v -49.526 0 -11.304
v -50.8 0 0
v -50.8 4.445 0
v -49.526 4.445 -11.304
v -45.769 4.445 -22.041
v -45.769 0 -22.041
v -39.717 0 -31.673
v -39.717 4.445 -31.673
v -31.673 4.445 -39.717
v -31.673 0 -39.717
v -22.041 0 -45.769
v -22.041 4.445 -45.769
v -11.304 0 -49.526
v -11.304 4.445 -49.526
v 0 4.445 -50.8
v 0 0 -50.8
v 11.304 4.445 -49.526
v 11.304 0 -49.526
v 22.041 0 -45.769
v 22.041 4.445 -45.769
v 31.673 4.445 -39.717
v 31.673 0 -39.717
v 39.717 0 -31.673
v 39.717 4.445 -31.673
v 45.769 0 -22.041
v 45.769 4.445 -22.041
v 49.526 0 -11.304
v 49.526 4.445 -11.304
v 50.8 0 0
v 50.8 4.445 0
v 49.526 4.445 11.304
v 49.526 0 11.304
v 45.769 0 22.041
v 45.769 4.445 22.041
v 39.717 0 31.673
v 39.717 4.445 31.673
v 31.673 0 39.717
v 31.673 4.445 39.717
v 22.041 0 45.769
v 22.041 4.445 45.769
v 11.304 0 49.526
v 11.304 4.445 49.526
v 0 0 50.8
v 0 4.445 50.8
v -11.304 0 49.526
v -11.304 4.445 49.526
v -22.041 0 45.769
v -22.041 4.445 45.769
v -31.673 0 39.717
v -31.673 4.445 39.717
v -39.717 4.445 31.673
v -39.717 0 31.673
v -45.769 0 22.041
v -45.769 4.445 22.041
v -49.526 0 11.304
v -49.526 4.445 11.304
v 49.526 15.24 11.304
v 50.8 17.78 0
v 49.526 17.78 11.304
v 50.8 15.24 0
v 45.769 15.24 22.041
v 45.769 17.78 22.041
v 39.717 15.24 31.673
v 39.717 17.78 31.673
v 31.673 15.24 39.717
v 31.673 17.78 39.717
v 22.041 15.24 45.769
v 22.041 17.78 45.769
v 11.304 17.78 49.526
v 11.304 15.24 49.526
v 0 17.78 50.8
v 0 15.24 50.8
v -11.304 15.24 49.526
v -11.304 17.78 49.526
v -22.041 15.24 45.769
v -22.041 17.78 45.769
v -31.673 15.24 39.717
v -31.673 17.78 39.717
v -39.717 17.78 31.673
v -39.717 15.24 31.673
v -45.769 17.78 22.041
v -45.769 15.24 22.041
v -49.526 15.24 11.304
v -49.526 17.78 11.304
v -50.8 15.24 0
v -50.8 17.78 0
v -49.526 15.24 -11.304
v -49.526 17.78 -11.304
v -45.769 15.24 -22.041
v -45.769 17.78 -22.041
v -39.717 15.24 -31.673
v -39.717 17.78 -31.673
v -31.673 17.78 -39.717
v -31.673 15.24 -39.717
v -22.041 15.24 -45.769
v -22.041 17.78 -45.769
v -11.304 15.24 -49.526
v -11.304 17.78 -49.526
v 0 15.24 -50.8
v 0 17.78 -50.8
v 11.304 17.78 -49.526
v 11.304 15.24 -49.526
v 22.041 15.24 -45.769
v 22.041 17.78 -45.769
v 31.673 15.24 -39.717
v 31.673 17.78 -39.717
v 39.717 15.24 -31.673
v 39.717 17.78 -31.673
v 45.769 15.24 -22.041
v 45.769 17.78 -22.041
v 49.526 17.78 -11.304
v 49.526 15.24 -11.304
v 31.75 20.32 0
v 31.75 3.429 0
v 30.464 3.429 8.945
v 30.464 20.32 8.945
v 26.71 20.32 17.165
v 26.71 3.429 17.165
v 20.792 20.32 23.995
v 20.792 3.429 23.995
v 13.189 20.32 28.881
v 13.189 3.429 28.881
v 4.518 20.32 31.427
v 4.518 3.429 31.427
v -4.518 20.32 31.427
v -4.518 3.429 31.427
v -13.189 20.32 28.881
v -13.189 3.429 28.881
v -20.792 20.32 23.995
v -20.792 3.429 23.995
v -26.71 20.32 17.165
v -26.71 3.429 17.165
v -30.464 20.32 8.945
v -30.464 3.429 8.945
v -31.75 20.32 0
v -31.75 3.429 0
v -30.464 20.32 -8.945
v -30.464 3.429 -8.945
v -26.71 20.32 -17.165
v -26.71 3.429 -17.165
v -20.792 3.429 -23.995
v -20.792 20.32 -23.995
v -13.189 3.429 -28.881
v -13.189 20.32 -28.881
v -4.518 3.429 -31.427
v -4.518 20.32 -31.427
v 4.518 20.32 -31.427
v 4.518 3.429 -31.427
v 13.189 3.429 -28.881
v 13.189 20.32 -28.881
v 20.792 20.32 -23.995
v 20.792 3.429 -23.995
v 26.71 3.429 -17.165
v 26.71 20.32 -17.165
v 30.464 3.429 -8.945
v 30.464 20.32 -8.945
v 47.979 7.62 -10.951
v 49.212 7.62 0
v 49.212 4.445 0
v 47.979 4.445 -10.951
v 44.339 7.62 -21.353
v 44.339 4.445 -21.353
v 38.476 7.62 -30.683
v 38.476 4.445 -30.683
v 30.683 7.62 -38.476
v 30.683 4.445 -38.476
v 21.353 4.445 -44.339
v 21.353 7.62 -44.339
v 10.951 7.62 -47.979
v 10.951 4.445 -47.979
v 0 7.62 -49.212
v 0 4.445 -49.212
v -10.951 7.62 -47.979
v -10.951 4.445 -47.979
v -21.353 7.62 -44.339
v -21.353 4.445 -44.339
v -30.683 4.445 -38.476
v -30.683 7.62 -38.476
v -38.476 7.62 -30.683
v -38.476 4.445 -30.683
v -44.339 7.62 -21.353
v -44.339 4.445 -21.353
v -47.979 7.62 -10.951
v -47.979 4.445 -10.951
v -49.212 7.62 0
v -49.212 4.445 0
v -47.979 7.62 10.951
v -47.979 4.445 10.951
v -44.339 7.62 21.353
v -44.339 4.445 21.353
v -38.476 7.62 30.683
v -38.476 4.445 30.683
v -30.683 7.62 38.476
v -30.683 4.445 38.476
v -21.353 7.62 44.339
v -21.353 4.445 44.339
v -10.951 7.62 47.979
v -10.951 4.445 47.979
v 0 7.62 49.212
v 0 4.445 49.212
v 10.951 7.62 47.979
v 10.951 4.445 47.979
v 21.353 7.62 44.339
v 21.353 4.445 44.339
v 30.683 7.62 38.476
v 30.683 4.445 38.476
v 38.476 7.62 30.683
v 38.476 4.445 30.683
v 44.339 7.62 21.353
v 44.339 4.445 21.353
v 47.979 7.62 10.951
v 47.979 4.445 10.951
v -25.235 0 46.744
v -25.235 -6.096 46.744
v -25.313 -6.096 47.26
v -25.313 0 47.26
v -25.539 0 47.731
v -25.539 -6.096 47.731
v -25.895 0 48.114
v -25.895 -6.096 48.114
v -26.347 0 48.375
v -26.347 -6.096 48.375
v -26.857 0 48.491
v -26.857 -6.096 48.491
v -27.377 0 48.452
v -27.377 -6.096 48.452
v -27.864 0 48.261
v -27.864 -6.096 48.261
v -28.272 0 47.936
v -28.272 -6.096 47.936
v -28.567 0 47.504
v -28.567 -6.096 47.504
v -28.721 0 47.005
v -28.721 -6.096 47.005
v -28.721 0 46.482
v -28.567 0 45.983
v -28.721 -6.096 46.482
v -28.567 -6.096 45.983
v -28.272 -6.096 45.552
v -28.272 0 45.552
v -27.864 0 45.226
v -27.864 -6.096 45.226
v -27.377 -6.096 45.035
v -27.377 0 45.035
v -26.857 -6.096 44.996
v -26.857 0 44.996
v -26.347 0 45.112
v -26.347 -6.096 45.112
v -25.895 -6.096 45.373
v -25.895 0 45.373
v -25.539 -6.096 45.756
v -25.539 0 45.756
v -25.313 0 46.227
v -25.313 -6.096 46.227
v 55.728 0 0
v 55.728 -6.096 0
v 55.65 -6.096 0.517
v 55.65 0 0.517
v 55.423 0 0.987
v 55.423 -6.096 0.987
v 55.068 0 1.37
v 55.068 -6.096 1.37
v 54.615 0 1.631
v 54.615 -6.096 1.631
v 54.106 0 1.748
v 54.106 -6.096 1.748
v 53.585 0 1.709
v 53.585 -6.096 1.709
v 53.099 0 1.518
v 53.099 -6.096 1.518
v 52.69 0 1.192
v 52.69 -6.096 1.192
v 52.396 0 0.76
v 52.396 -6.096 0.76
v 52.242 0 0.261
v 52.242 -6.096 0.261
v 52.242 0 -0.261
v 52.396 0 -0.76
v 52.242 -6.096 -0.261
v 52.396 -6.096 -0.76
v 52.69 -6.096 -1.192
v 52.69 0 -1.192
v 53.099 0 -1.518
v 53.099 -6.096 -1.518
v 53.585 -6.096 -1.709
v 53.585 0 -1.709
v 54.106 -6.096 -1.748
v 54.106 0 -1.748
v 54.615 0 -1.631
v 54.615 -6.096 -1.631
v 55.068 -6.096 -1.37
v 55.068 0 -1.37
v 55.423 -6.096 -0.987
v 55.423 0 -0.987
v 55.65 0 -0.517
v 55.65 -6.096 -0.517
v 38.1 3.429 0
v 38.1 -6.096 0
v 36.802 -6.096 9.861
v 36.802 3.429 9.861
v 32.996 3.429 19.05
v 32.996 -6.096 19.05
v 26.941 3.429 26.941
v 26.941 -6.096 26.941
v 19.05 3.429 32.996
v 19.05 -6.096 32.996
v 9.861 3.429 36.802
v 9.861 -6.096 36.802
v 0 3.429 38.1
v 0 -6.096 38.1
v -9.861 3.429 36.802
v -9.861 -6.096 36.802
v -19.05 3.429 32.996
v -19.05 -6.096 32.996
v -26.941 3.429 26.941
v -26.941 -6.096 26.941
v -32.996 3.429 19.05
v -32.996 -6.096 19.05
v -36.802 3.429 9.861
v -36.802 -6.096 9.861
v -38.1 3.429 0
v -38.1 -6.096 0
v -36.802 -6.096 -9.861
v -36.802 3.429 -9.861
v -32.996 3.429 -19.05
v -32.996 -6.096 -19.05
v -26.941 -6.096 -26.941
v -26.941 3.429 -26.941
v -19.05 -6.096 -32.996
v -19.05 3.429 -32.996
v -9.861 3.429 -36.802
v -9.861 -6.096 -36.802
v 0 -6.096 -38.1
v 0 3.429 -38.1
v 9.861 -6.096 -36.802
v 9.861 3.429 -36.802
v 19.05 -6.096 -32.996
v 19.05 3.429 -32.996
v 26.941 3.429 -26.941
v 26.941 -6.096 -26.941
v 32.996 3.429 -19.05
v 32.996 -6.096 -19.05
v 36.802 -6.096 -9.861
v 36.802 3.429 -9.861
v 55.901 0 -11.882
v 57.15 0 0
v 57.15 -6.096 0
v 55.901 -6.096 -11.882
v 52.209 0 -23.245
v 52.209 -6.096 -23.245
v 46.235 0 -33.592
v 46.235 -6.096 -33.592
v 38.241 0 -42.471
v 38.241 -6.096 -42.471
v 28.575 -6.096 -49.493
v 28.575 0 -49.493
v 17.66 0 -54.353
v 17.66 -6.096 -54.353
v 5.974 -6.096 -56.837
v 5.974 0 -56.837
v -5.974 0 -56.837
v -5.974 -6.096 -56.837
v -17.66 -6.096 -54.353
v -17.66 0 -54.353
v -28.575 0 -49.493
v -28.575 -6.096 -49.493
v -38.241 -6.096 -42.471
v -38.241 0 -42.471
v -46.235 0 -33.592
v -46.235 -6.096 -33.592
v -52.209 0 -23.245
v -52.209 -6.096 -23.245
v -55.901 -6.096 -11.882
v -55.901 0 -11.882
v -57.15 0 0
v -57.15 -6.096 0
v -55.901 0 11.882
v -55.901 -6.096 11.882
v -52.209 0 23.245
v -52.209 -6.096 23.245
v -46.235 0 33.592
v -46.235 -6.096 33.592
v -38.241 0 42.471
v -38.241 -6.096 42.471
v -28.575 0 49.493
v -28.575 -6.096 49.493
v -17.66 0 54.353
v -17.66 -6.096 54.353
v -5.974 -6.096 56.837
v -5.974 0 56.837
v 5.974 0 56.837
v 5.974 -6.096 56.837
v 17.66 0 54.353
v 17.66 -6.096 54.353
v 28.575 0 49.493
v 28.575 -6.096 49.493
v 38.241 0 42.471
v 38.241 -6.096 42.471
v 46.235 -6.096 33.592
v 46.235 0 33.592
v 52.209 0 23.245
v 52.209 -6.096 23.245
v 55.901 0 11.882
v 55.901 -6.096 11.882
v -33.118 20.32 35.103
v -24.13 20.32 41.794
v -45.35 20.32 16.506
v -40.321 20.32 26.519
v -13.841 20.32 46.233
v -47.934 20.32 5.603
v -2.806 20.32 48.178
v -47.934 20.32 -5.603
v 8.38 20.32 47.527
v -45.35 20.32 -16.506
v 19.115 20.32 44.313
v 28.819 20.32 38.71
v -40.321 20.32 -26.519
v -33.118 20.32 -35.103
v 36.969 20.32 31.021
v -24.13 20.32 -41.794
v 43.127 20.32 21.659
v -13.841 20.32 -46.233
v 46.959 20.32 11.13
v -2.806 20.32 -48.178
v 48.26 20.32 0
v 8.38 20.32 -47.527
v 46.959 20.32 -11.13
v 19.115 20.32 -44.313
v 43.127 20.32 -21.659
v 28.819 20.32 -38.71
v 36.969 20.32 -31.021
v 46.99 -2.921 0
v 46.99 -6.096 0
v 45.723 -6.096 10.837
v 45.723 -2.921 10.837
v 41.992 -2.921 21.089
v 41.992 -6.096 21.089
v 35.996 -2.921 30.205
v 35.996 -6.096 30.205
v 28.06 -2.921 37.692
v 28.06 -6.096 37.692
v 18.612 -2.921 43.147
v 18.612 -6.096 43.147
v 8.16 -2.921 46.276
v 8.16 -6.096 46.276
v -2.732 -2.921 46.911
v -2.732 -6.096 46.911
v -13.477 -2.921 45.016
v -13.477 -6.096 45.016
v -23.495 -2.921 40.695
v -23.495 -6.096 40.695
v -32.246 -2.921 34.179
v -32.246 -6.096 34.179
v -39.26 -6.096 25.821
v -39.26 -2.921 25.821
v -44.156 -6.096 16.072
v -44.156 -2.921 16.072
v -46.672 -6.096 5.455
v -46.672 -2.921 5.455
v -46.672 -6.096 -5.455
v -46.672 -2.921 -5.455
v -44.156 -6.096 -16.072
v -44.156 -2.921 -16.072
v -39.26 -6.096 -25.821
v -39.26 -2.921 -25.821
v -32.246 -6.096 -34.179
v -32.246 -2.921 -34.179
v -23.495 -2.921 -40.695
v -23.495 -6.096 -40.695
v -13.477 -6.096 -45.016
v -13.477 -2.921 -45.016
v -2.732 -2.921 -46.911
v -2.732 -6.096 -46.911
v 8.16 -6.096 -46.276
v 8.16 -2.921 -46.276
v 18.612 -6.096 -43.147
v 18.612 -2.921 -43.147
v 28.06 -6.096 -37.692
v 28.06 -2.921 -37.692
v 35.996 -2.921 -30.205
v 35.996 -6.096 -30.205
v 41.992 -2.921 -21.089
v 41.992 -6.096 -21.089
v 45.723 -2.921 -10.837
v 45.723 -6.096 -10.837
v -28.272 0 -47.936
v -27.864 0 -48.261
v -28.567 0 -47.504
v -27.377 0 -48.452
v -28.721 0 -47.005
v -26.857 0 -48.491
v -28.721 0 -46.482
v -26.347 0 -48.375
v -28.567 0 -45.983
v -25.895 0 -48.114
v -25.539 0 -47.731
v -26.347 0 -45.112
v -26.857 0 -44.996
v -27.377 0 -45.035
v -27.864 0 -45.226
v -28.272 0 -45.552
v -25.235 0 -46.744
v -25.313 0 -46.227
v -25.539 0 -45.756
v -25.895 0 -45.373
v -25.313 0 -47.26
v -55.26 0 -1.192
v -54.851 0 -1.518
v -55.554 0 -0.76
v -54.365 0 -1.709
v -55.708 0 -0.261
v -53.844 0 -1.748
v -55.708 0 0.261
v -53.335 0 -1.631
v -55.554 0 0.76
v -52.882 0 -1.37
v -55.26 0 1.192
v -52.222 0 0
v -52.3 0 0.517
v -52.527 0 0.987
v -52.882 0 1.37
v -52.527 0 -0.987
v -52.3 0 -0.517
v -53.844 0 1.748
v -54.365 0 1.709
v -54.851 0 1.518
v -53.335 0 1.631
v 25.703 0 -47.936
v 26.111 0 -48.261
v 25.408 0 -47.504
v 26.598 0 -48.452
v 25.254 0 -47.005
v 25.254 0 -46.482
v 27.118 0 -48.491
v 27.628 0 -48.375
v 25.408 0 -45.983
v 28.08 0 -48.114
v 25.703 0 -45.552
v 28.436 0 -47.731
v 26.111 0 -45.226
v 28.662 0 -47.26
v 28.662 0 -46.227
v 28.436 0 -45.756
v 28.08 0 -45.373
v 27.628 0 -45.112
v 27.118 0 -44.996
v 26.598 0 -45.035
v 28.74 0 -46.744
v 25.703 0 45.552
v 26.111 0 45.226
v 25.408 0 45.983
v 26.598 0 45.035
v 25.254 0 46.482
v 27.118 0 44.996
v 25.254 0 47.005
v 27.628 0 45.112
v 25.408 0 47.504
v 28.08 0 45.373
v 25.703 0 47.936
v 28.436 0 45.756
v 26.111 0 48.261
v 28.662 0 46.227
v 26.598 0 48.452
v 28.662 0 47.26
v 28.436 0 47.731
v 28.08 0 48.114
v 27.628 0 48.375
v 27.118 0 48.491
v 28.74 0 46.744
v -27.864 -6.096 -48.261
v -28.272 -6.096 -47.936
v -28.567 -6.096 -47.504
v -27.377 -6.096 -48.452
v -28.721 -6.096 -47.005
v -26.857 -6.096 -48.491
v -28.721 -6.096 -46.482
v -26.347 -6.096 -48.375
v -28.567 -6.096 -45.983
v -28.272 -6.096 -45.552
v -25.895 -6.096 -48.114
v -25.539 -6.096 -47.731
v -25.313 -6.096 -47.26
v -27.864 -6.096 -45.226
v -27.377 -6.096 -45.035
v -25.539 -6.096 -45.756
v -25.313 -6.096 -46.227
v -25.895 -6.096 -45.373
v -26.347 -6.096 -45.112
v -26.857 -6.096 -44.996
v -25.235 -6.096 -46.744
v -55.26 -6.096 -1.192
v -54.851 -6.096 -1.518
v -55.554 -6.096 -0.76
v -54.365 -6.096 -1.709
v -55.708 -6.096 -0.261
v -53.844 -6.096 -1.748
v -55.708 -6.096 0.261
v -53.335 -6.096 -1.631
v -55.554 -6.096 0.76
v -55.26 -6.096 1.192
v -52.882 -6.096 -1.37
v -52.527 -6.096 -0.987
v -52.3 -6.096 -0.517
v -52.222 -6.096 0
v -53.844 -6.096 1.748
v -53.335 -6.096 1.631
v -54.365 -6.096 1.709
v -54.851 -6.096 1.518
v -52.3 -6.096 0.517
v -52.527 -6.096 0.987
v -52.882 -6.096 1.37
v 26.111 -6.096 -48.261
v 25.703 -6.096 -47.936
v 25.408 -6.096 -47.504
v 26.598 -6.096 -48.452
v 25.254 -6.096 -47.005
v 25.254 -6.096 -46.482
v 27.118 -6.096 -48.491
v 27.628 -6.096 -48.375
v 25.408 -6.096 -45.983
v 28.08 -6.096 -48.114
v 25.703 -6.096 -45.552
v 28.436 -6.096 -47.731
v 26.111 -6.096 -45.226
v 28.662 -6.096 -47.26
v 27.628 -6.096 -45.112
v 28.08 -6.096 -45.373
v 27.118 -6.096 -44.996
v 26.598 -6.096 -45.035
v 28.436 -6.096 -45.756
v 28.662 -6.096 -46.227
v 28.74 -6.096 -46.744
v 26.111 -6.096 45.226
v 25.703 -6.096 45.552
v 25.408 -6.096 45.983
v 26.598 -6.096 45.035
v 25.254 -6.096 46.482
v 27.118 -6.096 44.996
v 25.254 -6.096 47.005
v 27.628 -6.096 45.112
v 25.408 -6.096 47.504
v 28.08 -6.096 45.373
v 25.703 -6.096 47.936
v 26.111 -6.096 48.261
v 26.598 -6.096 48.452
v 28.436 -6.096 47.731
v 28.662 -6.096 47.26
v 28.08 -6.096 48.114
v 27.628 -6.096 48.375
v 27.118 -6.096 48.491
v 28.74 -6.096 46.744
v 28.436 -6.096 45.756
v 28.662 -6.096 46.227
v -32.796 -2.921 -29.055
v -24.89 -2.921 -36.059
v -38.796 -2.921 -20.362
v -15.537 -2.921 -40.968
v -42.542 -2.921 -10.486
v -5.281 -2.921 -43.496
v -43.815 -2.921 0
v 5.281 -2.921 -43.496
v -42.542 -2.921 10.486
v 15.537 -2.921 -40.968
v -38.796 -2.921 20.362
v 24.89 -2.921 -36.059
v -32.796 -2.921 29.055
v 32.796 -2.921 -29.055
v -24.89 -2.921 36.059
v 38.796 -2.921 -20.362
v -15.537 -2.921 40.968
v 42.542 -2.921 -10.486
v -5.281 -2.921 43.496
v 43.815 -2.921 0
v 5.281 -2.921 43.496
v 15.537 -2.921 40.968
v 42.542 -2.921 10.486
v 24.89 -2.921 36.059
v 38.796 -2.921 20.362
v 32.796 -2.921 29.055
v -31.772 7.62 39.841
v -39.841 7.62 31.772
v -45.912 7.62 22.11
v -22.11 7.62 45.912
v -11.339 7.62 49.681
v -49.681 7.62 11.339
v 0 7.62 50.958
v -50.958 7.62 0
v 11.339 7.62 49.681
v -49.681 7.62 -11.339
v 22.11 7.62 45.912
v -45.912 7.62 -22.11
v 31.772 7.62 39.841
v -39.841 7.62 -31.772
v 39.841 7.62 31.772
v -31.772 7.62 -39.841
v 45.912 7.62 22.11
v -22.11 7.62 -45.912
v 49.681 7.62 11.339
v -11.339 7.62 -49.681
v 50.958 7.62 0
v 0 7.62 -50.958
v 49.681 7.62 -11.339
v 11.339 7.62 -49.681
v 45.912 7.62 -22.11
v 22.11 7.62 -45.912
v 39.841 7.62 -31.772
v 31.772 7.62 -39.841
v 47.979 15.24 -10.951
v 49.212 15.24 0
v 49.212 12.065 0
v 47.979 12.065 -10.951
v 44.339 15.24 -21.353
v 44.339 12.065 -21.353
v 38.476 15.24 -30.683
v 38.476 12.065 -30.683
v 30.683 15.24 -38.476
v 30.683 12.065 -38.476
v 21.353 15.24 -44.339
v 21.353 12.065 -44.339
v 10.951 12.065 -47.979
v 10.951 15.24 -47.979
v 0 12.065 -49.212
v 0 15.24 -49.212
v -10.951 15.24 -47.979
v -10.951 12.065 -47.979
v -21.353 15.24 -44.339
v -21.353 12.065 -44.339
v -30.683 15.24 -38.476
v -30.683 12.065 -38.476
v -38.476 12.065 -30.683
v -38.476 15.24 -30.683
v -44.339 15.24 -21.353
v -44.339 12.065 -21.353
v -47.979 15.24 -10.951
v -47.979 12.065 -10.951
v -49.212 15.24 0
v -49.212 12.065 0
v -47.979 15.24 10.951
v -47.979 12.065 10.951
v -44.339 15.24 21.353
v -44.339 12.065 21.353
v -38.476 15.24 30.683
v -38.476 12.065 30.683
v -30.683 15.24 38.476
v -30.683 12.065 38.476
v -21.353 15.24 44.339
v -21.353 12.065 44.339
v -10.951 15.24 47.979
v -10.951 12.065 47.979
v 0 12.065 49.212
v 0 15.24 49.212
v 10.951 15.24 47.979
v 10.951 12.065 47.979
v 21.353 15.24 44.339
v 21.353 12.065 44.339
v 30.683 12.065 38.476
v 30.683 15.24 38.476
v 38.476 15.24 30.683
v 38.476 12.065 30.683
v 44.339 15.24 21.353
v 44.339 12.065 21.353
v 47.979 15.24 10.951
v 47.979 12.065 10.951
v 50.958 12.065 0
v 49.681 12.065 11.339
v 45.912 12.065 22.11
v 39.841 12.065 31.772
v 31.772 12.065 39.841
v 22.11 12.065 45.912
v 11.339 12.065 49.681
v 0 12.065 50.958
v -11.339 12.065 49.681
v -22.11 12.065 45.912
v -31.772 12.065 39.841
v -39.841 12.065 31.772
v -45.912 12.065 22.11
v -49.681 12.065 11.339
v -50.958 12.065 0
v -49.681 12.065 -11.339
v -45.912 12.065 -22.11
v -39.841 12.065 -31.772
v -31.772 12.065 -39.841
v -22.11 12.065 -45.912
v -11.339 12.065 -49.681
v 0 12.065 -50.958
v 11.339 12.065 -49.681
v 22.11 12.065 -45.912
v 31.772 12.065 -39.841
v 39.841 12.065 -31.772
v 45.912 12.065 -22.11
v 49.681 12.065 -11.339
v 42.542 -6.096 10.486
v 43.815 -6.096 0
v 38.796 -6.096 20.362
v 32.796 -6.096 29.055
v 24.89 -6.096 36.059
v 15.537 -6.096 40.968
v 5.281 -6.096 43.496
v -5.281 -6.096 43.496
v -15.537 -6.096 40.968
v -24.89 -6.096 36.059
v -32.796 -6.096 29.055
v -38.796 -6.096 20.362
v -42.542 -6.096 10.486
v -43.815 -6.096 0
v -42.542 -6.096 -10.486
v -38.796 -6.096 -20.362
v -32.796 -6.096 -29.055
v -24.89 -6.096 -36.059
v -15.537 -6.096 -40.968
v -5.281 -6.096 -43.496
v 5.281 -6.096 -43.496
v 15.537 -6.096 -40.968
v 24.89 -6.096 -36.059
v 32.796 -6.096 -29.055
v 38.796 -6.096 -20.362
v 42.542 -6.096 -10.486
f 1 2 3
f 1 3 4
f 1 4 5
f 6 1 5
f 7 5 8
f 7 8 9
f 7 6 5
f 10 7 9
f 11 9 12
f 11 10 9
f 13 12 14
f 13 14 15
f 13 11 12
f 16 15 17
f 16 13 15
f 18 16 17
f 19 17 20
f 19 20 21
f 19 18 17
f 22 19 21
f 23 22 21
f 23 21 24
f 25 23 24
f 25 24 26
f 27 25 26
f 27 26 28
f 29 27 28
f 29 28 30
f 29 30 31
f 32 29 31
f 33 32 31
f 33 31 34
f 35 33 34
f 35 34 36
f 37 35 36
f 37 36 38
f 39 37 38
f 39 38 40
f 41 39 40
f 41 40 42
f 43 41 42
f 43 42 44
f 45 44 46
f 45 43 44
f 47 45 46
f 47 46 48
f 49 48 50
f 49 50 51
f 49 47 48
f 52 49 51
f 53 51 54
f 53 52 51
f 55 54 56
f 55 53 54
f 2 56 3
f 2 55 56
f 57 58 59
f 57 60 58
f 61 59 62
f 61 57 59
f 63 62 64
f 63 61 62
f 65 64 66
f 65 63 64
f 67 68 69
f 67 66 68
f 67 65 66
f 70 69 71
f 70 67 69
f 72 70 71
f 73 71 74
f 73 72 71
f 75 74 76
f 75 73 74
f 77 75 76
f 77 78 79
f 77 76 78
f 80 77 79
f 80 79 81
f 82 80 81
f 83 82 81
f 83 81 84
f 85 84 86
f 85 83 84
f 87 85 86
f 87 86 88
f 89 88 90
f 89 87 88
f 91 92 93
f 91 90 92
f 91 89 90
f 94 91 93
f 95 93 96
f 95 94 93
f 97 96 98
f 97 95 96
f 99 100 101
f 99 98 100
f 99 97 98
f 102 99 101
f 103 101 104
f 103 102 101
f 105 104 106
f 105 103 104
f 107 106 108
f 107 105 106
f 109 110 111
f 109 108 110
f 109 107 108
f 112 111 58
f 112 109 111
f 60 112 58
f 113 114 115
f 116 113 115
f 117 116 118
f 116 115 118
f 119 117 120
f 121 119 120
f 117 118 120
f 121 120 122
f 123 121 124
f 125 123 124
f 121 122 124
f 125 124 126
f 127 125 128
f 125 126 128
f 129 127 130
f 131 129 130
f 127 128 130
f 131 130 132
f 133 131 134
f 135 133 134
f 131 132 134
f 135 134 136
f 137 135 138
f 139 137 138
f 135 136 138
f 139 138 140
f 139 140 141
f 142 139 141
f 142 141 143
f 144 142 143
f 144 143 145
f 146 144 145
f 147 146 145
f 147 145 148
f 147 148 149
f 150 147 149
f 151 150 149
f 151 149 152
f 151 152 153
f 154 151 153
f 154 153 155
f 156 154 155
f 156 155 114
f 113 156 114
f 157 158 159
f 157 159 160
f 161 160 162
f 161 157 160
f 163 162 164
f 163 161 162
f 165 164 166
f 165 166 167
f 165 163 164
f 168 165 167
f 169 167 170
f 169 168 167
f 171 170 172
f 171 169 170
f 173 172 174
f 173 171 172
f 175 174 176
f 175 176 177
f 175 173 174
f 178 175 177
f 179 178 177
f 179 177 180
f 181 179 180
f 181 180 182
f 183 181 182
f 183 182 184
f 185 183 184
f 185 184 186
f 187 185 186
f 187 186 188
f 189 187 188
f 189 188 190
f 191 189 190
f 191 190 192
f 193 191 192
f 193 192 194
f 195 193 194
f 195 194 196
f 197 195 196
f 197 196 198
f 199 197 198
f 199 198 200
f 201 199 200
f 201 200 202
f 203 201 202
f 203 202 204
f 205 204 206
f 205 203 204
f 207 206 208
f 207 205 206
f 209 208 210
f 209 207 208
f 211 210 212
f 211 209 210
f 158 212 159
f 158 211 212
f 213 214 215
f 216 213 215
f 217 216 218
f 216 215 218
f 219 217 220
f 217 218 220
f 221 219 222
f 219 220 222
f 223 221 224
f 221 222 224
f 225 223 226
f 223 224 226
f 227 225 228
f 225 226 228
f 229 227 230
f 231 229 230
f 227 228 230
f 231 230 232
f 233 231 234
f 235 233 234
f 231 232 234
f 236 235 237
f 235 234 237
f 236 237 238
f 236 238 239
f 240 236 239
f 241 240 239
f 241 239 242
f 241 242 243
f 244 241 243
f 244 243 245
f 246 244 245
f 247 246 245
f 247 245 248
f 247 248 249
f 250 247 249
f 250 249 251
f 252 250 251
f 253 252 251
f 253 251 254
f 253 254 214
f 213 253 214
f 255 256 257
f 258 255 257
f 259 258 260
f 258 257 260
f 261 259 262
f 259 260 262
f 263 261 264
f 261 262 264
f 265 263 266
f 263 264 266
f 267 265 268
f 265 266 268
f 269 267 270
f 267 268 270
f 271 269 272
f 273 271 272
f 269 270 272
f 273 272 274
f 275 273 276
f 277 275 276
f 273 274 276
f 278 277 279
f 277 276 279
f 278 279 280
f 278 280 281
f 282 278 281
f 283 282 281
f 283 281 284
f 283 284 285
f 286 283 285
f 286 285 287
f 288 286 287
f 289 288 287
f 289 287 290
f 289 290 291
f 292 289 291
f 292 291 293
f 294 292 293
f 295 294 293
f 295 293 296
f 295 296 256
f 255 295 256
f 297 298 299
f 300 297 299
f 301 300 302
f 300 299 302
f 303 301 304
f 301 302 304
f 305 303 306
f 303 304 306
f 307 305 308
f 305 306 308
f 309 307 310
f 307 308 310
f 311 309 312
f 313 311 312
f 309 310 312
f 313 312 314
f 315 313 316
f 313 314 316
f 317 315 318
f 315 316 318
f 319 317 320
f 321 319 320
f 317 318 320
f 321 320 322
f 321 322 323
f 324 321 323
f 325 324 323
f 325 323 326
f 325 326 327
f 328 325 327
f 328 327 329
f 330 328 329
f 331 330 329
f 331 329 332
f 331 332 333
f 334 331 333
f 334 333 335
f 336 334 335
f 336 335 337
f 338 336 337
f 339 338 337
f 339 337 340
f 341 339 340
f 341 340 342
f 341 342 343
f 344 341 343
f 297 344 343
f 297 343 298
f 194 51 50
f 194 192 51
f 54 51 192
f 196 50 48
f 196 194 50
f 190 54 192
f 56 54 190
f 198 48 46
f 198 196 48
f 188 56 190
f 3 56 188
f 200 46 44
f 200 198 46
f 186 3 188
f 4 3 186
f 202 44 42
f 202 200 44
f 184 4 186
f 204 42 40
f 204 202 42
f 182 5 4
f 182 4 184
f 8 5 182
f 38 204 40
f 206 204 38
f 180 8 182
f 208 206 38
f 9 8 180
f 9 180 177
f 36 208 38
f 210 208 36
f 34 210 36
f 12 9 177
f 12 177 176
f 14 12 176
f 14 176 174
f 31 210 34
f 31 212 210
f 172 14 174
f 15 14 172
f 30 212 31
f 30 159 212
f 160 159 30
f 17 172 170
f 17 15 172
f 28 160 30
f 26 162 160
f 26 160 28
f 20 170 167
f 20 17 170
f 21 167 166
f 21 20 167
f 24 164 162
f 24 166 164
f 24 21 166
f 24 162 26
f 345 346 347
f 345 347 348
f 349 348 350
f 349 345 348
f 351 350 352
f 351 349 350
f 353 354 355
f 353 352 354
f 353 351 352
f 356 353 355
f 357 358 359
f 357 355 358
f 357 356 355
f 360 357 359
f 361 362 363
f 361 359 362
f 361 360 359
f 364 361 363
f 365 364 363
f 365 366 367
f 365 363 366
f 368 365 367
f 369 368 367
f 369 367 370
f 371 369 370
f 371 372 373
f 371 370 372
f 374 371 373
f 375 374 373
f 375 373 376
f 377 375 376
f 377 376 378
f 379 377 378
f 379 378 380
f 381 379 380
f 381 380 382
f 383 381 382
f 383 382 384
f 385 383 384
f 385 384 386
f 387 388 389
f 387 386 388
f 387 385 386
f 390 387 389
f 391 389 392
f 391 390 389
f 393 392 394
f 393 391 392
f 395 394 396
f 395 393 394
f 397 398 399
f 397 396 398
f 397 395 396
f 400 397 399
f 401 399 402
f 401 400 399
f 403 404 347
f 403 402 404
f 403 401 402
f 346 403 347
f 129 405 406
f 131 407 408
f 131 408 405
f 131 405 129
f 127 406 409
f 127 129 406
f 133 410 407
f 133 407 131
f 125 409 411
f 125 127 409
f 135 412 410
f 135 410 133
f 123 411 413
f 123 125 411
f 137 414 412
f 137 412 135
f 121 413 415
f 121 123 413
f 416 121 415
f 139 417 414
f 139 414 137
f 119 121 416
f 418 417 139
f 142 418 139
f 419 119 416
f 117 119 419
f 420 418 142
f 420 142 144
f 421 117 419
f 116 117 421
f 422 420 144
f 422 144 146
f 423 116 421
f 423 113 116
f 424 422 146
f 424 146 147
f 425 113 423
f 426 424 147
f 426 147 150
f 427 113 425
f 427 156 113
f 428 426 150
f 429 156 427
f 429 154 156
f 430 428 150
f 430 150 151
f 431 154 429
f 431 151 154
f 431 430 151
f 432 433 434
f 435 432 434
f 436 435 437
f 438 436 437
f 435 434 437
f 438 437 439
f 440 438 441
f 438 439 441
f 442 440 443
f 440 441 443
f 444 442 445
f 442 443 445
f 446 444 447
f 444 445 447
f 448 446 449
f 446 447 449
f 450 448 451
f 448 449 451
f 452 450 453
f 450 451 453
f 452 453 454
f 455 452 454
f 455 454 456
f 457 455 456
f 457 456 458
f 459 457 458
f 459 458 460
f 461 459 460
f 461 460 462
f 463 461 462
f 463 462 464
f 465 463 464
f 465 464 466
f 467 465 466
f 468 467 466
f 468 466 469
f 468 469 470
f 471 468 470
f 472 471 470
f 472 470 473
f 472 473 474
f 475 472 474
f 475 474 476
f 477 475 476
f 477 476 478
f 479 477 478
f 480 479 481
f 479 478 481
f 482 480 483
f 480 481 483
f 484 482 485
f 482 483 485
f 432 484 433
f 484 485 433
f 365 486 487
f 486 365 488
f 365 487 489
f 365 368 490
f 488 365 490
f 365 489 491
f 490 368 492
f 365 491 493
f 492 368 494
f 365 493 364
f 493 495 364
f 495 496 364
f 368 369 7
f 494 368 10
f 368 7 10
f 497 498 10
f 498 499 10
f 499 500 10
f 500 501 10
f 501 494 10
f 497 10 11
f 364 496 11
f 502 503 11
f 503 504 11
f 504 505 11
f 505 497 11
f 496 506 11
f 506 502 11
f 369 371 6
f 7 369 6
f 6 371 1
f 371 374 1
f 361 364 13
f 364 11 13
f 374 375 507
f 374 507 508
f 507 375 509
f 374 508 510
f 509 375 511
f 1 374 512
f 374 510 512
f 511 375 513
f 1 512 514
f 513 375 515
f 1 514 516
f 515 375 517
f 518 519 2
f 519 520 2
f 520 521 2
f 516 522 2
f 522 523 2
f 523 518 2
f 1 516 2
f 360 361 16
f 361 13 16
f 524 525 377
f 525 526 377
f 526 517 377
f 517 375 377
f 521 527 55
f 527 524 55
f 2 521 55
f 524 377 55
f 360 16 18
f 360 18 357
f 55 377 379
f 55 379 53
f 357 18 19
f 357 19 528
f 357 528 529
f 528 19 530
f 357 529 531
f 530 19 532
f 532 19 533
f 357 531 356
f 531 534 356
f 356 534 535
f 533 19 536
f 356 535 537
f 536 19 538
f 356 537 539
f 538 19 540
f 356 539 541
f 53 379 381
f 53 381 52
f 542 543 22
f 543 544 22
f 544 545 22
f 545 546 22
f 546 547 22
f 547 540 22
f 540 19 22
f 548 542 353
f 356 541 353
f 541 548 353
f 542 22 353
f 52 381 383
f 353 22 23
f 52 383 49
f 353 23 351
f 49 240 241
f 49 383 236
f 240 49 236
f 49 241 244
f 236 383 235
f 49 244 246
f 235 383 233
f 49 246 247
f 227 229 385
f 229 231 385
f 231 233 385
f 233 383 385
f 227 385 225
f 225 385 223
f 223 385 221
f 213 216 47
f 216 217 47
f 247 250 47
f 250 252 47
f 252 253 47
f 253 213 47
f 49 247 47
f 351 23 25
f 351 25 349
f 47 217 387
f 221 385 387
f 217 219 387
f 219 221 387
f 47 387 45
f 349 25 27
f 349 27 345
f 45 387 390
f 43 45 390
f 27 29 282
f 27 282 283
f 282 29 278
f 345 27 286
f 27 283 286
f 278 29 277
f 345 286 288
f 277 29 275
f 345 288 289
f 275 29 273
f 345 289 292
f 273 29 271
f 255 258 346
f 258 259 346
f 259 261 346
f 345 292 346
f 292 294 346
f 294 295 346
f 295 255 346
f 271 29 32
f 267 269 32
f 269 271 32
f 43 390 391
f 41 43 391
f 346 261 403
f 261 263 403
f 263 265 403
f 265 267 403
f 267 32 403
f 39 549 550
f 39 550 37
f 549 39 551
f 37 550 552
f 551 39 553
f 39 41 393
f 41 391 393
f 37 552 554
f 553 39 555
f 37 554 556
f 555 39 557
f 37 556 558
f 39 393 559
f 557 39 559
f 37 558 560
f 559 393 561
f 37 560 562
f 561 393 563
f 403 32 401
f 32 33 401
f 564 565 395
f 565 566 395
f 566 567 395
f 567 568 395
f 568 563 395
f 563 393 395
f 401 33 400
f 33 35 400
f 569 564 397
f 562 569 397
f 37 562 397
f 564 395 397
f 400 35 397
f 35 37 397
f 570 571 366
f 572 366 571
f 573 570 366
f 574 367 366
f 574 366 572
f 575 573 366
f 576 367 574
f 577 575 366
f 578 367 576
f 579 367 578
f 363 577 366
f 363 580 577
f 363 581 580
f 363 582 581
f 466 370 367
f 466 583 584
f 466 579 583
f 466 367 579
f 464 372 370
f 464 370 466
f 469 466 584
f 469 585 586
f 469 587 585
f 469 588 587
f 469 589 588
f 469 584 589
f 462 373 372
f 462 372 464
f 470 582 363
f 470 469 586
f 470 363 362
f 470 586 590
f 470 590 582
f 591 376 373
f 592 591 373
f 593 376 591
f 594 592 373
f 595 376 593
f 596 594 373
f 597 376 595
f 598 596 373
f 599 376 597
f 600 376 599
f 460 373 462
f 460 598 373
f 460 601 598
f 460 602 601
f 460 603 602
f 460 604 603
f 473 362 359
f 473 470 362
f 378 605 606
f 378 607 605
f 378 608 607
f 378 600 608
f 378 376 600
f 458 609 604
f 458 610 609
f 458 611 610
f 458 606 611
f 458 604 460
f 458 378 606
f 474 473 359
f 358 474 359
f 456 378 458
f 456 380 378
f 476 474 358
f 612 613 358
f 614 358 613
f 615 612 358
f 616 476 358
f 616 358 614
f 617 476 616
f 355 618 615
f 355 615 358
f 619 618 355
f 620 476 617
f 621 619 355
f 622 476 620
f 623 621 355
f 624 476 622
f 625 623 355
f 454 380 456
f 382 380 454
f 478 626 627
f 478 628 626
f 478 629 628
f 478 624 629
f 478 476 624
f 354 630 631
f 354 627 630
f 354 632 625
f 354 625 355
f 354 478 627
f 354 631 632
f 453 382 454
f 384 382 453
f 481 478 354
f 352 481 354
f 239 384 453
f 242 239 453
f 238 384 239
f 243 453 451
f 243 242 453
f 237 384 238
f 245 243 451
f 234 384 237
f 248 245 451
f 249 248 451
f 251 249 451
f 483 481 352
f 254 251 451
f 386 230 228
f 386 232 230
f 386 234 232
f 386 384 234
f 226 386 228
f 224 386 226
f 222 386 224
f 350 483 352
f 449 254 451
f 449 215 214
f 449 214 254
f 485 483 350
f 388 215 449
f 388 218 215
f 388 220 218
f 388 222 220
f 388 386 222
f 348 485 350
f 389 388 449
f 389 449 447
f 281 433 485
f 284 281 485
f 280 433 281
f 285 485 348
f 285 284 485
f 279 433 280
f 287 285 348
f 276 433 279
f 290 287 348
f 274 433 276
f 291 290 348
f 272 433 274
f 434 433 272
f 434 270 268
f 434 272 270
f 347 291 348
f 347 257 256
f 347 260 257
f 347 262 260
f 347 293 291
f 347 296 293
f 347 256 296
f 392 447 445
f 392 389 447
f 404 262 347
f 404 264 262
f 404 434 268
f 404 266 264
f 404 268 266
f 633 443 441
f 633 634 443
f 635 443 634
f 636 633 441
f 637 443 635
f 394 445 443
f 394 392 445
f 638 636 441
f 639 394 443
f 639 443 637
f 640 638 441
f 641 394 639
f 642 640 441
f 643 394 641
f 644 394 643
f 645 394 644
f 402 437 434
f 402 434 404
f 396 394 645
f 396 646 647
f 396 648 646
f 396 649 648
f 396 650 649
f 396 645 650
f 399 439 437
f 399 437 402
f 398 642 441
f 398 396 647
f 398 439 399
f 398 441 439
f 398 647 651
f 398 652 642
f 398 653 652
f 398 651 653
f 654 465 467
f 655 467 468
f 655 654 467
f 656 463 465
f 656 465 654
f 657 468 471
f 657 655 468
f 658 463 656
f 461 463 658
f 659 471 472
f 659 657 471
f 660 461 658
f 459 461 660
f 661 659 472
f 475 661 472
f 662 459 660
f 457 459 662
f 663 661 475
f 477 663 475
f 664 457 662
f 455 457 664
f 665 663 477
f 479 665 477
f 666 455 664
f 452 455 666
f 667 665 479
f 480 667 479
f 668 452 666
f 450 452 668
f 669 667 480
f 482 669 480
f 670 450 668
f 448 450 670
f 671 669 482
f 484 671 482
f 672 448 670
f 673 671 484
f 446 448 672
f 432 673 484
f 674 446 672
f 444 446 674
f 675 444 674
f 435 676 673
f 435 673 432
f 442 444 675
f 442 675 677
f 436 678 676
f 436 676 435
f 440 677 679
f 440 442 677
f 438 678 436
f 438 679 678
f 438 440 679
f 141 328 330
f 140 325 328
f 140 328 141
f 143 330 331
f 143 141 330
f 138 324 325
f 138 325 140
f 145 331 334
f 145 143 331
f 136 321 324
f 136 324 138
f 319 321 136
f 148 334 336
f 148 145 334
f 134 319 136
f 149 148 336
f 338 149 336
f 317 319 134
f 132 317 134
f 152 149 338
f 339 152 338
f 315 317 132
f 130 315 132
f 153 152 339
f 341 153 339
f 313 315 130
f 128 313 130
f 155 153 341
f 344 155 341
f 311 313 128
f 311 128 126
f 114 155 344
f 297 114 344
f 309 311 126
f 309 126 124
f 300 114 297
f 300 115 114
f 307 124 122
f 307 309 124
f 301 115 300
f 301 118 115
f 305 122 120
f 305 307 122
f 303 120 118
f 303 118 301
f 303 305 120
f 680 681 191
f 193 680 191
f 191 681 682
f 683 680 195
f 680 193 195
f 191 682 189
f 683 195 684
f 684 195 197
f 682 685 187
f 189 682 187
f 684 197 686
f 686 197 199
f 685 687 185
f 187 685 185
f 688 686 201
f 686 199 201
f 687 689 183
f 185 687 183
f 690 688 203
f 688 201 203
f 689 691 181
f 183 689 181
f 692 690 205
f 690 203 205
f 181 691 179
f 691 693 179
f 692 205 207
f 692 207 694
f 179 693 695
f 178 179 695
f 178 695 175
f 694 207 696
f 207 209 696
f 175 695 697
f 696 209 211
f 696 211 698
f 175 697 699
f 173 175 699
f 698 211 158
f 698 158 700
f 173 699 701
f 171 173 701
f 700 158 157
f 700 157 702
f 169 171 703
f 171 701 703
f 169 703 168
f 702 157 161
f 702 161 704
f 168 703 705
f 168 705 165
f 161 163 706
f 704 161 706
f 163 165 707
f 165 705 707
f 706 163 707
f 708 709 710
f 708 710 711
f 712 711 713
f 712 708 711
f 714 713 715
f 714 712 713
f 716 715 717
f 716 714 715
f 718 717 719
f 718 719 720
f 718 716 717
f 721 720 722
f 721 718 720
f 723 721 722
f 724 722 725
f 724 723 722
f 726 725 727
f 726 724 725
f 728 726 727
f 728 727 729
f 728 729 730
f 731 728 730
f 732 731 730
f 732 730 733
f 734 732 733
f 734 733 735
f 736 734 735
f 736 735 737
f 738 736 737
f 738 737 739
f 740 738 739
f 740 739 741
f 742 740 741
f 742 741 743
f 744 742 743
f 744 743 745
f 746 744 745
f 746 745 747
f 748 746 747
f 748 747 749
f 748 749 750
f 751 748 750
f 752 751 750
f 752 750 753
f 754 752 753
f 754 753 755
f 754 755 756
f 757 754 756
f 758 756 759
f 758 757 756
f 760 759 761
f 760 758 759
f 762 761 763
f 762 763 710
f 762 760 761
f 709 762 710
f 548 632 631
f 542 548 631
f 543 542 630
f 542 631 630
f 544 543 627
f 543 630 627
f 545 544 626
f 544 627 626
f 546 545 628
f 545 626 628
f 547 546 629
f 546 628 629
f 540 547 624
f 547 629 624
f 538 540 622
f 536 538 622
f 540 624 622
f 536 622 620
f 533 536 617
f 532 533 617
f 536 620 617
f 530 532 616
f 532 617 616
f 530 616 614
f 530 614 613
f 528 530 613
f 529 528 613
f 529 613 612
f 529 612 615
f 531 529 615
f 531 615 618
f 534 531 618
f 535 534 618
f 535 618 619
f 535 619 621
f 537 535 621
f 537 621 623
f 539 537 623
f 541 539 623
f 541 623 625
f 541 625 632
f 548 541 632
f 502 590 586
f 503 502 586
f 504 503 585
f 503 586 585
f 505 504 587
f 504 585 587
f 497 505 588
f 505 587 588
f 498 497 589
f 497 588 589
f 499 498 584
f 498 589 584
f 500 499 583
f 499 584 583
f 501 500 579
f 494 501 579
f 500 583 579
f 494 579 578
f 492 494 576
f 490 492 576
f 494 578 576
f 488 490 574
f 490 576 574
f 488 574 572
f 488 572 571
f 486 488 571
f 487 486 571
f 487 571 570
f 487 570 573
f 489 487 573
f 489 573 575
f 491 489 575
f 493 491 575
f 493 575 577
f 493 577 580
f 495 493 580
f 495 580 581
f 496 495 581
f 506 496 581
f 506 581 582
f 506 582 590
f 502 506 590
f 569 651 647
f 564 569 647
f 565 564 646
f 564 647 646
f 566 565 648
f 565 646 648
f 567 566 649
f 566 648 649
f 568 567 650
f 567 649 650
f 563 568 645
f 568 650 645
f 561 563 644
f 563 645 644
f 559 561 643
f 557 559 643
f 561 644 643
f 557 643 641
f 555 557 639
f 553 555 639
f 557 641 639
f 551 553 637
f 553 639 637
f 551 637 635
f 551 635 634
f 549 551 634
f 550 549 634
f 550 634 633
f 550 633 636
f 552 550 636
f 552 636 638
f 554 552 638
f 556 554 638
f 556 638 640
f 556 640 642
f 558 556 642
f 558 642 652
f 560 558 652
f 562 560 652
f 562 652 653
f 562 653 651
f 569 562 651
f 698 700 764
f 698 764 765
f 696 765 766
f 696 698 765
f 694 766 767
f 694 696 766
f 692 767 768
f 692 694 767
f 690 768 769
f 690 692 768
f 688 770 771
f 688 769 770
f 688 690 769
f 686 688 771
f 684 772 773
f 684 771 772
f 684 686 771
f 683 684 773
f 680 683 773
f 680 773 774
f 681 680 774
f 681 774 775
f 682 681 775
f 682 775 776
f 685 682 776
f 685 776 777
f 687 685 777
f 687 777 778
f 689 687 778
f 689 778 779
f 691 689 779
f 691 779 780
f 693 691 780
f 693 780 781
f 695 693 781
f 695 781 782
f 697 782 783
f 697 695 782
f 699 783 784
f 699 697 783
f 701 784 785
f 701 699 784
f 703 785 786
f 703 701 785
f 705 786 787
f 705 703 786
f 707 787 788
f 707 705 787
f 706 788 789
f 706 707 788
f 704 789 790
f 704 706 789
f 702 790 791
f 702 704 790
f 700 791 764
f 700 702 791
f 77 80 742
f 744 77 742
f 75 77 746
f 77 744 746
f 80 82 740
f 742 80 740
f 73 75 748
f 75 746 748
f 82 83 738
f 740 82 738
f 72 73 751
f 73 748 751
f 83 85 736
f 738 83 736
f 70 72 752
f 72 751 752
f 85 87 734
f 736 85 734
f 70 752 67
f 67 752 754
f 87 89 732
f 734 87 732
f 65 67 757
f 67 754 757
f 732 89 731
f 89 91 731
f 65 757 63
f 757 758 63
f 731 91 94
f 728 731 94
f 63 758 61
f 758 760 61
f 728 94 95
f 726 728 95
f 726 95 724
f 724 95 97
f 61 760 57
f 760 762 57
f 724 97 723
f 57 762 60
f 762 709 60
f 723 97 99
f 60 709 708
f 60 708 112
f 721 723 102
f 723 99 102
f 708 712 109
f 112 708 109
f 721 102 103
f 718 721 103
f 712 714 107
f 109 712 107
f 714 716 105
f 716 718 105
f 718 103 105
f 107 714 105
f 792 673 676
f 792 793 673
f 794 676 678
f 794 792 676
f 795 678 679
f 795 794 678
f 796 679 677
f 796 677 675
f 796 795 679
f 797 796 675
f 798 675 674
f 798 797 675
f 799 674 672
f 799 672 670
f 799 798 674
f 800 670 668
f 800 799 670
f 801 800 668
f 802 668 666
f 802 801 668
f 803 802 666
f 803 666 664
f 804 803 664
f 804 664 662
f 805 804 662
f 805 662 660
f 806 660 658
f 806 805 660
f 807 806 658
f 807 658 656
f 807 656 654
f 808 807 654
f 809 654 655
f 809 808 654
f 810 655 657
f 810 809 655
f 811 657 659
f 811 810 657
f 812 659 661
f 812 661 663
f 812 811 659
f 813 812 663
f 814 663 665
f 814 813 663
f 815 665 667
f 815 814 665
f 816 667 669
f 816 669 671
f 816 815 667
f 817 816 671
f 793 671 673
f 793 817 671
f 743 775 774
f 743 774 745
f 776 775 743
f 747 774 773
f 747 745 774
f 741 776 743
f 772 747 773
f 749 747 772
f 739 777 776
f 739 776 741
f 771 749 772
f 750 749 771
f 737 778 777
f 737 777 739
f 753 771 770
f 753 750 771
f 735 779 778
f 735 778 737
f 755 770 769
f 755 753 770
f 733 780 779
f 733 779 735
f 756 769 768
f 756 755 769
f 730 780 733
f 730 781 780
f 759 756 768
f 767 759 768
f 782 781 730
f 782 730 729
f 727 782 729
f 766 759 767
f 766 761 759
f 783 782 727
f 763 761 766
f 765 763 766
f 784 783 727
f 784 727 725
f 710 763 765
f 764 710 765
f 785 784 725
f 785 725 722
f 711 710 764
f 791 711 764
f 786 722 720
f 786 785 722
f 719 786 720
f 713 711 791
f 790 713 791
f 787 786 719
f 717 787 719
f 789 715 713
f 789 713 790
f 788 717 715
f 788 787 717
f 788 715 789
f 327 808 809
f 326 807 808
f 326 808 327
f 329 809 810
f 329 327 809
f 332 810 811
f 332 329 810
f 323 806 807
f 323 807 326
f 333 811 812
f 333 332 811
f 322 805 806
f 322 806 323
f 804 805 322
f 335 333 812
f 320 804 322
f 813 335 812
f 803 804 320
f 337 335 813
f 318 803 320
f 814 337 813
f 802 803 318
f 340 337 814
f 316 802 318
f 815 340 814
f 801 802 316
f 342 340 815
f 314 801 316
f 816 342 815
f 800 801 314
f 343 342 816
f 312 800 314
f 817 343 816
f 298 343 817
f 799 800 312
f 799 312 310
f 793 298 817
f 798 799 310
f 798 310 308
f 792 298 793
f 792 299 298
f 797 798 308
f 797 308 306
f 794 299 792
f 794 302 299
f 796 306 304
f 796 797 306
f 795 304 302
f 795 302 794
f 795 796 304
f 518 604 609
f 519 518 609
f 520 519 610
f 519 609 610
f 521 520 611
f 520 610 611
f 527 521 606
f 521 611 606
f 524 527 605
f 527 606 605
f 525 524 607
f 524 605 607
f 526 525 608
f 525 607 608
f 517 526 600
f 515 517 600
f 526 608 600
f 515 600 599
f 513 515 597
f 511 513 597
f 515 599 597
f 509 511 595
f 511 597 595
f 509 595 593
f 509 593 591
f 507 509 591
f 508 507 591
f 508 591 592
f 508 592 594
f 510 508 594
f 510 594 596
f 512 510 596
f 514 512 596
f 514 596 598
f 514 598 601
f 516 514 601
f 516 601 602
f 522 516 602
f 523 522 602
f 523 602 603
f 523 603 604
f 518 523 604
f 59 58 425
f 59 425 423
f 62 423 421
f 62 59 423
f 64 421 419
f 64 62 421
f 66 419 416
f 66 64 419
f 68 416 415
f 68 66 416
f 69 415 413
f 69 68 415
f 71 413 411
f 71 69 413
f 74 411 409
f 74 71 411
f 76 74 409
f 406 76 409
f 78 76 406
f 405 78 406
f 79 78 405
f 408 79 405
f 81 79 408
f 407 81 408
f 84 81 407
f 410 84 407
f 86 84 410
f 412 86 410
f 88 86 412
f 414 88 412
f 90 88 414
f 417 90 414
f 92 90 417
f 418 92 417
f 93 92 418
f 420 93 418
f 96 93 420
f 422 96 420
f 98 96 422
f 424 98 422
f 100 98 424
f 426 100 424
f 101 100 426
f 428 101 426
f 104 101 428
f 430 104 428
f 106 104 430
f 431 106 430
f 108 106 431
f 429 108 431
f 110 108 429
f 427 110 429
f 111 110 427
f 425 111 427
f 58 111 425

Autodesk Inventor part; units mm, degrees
ref_plane "YZ Plane" through (0, 0, 0) normal (1, 0, 0) x (0, 1, 0)
ref_plane "XZ Plane" through (0, 0, 0) normal (0, 1, 0) x (-1, 0, 0)
ref_plane "XY Plane" through (0, 0, 0) normal (0, 0, 1) x (1, 0, 0)
sketch "Sketch1" plane through (0, 0, 0) normal (0, 1, 0) x (-1, 0, 0)
  circle A0 centre (0, 0) radius 50.8
  dimension "d0" = 101.6
extrude "Extrusion1" add sketch "Sketch1" along normal blind 7.62
sketch "Sketch2" plane through (0, 7.62, 0) normal (0, 1, 0) x (1, 0, 0)
  circle A0 centre (0, 0) radius 49.2125
  circle A1 centre (0, 0) radius 50.8
  dimension "d3" = 98.425
extrude "Extrusion2" cut sketch "Sketch2" against normal blind 3.175
sketch "Sketch3" plane through (0, 7.62, 0) normal (0, 1, 0) x (1, 0, 0)
  circle A0 centre (0, 0) radius 50.9584
extrude "Extrusion3" add sketch "Sketch3" along normal blind 7.62
sketch "Sketch4" plane through (0, 15.24, 0) normal (0, 1, 0) x (1, 0, 0)
  point P0 (0, 0)
sketch "Sketch5" plane through (0, 15.24, 0) normal (0, 1, 0) x (1, 0, 0)
  circle A0 centre (0, 0) radius 49.2125
  circle A1 centre (0, 0) radius 50.9584
  dimension "d8" = 98.425
extrude "Extrusion4" cut sketch "Sketch5" against normal blind 3.175
sketch "Sketch6" plane through (0, 15.24, 0) normal (0, 1, 0) x (1, 0, 0)
  circle A0 centre (0, 0) radius 50.8
  dimension "d11" = 101.6
extrude "Extrusion5" add sketch "Sketch6" along normal blind 5.08
sketch "Sketch7" plane through (0, 0, 0) normal (0, -1, 0) x (1, 0, 0)
  circle A0 centre (0, 0) radius 57.15
  dimension "d14" = 114.3
extrude "Extrusion6" add sketch "Sketch7" along normal blind 6.096
chamfer "Chamfer1" distance 2.54 angle 45 1 edges at (-50.8, 20.32, 0)
sketch "Sketch8" plane through (0, -6.096, 0) normal (0, -1, 0) x (1, 0, 0)
  circle A0 centre (0, 0) radius 50.8
  circle A1 centre (53.975, 0) radius 1.7526
  circle A2 centre (26.9875, 46.7437) radius 1.7526
  circle A3 centre (-26.9875, 46.7437) radius 1.7526
  circle A4 centre (-53.975, 0) radius 1.7526
  circle A5 centre (-26.9875, -46.7437) radius 1.7526
  circle A6 centre (26.9875, -46.7437) radius 1.7526
  circle A7 centre (46.7437, 26.9875) radius 1.7526
  circle A8 centre (26.9875, 46.7437) radius 1.7526
  circle A9 centre (0, 53.975) radius 1.7526
  circle A10 centre (-26.9875, 46.7437) radius 1.7526
  circle A11 centre (-46.7437, 26.9875) radius 1.7526
  circle A12 centre (-53.975, 0) radius 1.7526
  circle A13 centre (-46.7437, -26.9875) radius 1.7526
  circle A14 centre (-26.9875, -46.7437) radius 1.7526
  circle A15 centre (0, -53.975) radius 1.7526
  circle A16 centre (26.9875, -46.7437) radius 1.7526
  circle A17 centre (46.7437, -26.9875) radius 1.7526
  dimension "d20" = 3.5052
  dimension "d21" = 53.975
  dimension "d24" = 360
  dimension "d44" = 360
extrude "Extrusion7" cut sketch "Sketch8" against normal blind 6.096 contours A1 | A2 | A3 | A4 | A5 | A6
sketch "Sketch9" plane through (0, -6.096, 0) normal (0, -1, 0) x (1, 0, 0)
  circle A0 centre (0, 0) radius 12.7
  circle A1 centre (0, 0) radius 1.27
  dimension "d28" = 25.4
  dimension "d29" = 2.54
extrude "Extrusion8" cut sketch "Sketch9" against normal blind 127 contours A1
sketch "Sketch10" plane through (0, -6.096, 0) normal (0, -1, 0) x (1, 0, 0)
  circle A0 centre (0, 0) radius 1.27 projected
  circle A1 centre (0, 0) radius 38.1
  dimension "d33" = 76.2
extrude "Extrusion9" cut sketch "Sketch10" against normal blind 9.525
sketch "Sketch11" plane through (0, 3.429, 0) normal (0, -1, 0) x (1, 0, 0)
  circle A0 centre (0, 0) radius 12.7
  circle A1 centre (0, 0) radius 1.27
  dimension "d36" = 25.4
extrude "Extrusion10" add sketch "Sketch11" along normal blind 9.525
sketch "Sketch12" plane through (0, -6.096, 0) normal (0, -1, 0) x (1, 0, 0)
  circle A0 centre (0, 0) radius 31.75
  dimension "d39" = 63.5
extrude "Extrusion11" cut sketch "Sketch12" against normal blind 40.64
sketch "Sketch13" plane through (0, 3.429, 0) normal (0, -1, 0) x (1, 0, 0)
  point P0 (0, 0)
sketch "Sketch14" plane through (0, -6.096, 0) normal (0, -1, 0) x (1, 0, 0)
  point P0 (0, 0)
sketch "Sketch15" plane through (0, -6.096, 0) normal (0, -1, 0) x (1, 0, 0)
  circle A0 centre (0, 0) radius 46.99
  circle A1 centre (0, 0) radius 43.815
  dimension "d46" = 93.98
  dimension "d47" = 87.63
extrude "Extrusion12" cut sketch "Sketch15" against normal blind 3.175
sketch "Sketch16" plane through (0, -6.096, 0) normal (0, -1, 0) x (1, 0, 0)
  point P0 (0, 0)
properties part number "O ring Dome 2"
